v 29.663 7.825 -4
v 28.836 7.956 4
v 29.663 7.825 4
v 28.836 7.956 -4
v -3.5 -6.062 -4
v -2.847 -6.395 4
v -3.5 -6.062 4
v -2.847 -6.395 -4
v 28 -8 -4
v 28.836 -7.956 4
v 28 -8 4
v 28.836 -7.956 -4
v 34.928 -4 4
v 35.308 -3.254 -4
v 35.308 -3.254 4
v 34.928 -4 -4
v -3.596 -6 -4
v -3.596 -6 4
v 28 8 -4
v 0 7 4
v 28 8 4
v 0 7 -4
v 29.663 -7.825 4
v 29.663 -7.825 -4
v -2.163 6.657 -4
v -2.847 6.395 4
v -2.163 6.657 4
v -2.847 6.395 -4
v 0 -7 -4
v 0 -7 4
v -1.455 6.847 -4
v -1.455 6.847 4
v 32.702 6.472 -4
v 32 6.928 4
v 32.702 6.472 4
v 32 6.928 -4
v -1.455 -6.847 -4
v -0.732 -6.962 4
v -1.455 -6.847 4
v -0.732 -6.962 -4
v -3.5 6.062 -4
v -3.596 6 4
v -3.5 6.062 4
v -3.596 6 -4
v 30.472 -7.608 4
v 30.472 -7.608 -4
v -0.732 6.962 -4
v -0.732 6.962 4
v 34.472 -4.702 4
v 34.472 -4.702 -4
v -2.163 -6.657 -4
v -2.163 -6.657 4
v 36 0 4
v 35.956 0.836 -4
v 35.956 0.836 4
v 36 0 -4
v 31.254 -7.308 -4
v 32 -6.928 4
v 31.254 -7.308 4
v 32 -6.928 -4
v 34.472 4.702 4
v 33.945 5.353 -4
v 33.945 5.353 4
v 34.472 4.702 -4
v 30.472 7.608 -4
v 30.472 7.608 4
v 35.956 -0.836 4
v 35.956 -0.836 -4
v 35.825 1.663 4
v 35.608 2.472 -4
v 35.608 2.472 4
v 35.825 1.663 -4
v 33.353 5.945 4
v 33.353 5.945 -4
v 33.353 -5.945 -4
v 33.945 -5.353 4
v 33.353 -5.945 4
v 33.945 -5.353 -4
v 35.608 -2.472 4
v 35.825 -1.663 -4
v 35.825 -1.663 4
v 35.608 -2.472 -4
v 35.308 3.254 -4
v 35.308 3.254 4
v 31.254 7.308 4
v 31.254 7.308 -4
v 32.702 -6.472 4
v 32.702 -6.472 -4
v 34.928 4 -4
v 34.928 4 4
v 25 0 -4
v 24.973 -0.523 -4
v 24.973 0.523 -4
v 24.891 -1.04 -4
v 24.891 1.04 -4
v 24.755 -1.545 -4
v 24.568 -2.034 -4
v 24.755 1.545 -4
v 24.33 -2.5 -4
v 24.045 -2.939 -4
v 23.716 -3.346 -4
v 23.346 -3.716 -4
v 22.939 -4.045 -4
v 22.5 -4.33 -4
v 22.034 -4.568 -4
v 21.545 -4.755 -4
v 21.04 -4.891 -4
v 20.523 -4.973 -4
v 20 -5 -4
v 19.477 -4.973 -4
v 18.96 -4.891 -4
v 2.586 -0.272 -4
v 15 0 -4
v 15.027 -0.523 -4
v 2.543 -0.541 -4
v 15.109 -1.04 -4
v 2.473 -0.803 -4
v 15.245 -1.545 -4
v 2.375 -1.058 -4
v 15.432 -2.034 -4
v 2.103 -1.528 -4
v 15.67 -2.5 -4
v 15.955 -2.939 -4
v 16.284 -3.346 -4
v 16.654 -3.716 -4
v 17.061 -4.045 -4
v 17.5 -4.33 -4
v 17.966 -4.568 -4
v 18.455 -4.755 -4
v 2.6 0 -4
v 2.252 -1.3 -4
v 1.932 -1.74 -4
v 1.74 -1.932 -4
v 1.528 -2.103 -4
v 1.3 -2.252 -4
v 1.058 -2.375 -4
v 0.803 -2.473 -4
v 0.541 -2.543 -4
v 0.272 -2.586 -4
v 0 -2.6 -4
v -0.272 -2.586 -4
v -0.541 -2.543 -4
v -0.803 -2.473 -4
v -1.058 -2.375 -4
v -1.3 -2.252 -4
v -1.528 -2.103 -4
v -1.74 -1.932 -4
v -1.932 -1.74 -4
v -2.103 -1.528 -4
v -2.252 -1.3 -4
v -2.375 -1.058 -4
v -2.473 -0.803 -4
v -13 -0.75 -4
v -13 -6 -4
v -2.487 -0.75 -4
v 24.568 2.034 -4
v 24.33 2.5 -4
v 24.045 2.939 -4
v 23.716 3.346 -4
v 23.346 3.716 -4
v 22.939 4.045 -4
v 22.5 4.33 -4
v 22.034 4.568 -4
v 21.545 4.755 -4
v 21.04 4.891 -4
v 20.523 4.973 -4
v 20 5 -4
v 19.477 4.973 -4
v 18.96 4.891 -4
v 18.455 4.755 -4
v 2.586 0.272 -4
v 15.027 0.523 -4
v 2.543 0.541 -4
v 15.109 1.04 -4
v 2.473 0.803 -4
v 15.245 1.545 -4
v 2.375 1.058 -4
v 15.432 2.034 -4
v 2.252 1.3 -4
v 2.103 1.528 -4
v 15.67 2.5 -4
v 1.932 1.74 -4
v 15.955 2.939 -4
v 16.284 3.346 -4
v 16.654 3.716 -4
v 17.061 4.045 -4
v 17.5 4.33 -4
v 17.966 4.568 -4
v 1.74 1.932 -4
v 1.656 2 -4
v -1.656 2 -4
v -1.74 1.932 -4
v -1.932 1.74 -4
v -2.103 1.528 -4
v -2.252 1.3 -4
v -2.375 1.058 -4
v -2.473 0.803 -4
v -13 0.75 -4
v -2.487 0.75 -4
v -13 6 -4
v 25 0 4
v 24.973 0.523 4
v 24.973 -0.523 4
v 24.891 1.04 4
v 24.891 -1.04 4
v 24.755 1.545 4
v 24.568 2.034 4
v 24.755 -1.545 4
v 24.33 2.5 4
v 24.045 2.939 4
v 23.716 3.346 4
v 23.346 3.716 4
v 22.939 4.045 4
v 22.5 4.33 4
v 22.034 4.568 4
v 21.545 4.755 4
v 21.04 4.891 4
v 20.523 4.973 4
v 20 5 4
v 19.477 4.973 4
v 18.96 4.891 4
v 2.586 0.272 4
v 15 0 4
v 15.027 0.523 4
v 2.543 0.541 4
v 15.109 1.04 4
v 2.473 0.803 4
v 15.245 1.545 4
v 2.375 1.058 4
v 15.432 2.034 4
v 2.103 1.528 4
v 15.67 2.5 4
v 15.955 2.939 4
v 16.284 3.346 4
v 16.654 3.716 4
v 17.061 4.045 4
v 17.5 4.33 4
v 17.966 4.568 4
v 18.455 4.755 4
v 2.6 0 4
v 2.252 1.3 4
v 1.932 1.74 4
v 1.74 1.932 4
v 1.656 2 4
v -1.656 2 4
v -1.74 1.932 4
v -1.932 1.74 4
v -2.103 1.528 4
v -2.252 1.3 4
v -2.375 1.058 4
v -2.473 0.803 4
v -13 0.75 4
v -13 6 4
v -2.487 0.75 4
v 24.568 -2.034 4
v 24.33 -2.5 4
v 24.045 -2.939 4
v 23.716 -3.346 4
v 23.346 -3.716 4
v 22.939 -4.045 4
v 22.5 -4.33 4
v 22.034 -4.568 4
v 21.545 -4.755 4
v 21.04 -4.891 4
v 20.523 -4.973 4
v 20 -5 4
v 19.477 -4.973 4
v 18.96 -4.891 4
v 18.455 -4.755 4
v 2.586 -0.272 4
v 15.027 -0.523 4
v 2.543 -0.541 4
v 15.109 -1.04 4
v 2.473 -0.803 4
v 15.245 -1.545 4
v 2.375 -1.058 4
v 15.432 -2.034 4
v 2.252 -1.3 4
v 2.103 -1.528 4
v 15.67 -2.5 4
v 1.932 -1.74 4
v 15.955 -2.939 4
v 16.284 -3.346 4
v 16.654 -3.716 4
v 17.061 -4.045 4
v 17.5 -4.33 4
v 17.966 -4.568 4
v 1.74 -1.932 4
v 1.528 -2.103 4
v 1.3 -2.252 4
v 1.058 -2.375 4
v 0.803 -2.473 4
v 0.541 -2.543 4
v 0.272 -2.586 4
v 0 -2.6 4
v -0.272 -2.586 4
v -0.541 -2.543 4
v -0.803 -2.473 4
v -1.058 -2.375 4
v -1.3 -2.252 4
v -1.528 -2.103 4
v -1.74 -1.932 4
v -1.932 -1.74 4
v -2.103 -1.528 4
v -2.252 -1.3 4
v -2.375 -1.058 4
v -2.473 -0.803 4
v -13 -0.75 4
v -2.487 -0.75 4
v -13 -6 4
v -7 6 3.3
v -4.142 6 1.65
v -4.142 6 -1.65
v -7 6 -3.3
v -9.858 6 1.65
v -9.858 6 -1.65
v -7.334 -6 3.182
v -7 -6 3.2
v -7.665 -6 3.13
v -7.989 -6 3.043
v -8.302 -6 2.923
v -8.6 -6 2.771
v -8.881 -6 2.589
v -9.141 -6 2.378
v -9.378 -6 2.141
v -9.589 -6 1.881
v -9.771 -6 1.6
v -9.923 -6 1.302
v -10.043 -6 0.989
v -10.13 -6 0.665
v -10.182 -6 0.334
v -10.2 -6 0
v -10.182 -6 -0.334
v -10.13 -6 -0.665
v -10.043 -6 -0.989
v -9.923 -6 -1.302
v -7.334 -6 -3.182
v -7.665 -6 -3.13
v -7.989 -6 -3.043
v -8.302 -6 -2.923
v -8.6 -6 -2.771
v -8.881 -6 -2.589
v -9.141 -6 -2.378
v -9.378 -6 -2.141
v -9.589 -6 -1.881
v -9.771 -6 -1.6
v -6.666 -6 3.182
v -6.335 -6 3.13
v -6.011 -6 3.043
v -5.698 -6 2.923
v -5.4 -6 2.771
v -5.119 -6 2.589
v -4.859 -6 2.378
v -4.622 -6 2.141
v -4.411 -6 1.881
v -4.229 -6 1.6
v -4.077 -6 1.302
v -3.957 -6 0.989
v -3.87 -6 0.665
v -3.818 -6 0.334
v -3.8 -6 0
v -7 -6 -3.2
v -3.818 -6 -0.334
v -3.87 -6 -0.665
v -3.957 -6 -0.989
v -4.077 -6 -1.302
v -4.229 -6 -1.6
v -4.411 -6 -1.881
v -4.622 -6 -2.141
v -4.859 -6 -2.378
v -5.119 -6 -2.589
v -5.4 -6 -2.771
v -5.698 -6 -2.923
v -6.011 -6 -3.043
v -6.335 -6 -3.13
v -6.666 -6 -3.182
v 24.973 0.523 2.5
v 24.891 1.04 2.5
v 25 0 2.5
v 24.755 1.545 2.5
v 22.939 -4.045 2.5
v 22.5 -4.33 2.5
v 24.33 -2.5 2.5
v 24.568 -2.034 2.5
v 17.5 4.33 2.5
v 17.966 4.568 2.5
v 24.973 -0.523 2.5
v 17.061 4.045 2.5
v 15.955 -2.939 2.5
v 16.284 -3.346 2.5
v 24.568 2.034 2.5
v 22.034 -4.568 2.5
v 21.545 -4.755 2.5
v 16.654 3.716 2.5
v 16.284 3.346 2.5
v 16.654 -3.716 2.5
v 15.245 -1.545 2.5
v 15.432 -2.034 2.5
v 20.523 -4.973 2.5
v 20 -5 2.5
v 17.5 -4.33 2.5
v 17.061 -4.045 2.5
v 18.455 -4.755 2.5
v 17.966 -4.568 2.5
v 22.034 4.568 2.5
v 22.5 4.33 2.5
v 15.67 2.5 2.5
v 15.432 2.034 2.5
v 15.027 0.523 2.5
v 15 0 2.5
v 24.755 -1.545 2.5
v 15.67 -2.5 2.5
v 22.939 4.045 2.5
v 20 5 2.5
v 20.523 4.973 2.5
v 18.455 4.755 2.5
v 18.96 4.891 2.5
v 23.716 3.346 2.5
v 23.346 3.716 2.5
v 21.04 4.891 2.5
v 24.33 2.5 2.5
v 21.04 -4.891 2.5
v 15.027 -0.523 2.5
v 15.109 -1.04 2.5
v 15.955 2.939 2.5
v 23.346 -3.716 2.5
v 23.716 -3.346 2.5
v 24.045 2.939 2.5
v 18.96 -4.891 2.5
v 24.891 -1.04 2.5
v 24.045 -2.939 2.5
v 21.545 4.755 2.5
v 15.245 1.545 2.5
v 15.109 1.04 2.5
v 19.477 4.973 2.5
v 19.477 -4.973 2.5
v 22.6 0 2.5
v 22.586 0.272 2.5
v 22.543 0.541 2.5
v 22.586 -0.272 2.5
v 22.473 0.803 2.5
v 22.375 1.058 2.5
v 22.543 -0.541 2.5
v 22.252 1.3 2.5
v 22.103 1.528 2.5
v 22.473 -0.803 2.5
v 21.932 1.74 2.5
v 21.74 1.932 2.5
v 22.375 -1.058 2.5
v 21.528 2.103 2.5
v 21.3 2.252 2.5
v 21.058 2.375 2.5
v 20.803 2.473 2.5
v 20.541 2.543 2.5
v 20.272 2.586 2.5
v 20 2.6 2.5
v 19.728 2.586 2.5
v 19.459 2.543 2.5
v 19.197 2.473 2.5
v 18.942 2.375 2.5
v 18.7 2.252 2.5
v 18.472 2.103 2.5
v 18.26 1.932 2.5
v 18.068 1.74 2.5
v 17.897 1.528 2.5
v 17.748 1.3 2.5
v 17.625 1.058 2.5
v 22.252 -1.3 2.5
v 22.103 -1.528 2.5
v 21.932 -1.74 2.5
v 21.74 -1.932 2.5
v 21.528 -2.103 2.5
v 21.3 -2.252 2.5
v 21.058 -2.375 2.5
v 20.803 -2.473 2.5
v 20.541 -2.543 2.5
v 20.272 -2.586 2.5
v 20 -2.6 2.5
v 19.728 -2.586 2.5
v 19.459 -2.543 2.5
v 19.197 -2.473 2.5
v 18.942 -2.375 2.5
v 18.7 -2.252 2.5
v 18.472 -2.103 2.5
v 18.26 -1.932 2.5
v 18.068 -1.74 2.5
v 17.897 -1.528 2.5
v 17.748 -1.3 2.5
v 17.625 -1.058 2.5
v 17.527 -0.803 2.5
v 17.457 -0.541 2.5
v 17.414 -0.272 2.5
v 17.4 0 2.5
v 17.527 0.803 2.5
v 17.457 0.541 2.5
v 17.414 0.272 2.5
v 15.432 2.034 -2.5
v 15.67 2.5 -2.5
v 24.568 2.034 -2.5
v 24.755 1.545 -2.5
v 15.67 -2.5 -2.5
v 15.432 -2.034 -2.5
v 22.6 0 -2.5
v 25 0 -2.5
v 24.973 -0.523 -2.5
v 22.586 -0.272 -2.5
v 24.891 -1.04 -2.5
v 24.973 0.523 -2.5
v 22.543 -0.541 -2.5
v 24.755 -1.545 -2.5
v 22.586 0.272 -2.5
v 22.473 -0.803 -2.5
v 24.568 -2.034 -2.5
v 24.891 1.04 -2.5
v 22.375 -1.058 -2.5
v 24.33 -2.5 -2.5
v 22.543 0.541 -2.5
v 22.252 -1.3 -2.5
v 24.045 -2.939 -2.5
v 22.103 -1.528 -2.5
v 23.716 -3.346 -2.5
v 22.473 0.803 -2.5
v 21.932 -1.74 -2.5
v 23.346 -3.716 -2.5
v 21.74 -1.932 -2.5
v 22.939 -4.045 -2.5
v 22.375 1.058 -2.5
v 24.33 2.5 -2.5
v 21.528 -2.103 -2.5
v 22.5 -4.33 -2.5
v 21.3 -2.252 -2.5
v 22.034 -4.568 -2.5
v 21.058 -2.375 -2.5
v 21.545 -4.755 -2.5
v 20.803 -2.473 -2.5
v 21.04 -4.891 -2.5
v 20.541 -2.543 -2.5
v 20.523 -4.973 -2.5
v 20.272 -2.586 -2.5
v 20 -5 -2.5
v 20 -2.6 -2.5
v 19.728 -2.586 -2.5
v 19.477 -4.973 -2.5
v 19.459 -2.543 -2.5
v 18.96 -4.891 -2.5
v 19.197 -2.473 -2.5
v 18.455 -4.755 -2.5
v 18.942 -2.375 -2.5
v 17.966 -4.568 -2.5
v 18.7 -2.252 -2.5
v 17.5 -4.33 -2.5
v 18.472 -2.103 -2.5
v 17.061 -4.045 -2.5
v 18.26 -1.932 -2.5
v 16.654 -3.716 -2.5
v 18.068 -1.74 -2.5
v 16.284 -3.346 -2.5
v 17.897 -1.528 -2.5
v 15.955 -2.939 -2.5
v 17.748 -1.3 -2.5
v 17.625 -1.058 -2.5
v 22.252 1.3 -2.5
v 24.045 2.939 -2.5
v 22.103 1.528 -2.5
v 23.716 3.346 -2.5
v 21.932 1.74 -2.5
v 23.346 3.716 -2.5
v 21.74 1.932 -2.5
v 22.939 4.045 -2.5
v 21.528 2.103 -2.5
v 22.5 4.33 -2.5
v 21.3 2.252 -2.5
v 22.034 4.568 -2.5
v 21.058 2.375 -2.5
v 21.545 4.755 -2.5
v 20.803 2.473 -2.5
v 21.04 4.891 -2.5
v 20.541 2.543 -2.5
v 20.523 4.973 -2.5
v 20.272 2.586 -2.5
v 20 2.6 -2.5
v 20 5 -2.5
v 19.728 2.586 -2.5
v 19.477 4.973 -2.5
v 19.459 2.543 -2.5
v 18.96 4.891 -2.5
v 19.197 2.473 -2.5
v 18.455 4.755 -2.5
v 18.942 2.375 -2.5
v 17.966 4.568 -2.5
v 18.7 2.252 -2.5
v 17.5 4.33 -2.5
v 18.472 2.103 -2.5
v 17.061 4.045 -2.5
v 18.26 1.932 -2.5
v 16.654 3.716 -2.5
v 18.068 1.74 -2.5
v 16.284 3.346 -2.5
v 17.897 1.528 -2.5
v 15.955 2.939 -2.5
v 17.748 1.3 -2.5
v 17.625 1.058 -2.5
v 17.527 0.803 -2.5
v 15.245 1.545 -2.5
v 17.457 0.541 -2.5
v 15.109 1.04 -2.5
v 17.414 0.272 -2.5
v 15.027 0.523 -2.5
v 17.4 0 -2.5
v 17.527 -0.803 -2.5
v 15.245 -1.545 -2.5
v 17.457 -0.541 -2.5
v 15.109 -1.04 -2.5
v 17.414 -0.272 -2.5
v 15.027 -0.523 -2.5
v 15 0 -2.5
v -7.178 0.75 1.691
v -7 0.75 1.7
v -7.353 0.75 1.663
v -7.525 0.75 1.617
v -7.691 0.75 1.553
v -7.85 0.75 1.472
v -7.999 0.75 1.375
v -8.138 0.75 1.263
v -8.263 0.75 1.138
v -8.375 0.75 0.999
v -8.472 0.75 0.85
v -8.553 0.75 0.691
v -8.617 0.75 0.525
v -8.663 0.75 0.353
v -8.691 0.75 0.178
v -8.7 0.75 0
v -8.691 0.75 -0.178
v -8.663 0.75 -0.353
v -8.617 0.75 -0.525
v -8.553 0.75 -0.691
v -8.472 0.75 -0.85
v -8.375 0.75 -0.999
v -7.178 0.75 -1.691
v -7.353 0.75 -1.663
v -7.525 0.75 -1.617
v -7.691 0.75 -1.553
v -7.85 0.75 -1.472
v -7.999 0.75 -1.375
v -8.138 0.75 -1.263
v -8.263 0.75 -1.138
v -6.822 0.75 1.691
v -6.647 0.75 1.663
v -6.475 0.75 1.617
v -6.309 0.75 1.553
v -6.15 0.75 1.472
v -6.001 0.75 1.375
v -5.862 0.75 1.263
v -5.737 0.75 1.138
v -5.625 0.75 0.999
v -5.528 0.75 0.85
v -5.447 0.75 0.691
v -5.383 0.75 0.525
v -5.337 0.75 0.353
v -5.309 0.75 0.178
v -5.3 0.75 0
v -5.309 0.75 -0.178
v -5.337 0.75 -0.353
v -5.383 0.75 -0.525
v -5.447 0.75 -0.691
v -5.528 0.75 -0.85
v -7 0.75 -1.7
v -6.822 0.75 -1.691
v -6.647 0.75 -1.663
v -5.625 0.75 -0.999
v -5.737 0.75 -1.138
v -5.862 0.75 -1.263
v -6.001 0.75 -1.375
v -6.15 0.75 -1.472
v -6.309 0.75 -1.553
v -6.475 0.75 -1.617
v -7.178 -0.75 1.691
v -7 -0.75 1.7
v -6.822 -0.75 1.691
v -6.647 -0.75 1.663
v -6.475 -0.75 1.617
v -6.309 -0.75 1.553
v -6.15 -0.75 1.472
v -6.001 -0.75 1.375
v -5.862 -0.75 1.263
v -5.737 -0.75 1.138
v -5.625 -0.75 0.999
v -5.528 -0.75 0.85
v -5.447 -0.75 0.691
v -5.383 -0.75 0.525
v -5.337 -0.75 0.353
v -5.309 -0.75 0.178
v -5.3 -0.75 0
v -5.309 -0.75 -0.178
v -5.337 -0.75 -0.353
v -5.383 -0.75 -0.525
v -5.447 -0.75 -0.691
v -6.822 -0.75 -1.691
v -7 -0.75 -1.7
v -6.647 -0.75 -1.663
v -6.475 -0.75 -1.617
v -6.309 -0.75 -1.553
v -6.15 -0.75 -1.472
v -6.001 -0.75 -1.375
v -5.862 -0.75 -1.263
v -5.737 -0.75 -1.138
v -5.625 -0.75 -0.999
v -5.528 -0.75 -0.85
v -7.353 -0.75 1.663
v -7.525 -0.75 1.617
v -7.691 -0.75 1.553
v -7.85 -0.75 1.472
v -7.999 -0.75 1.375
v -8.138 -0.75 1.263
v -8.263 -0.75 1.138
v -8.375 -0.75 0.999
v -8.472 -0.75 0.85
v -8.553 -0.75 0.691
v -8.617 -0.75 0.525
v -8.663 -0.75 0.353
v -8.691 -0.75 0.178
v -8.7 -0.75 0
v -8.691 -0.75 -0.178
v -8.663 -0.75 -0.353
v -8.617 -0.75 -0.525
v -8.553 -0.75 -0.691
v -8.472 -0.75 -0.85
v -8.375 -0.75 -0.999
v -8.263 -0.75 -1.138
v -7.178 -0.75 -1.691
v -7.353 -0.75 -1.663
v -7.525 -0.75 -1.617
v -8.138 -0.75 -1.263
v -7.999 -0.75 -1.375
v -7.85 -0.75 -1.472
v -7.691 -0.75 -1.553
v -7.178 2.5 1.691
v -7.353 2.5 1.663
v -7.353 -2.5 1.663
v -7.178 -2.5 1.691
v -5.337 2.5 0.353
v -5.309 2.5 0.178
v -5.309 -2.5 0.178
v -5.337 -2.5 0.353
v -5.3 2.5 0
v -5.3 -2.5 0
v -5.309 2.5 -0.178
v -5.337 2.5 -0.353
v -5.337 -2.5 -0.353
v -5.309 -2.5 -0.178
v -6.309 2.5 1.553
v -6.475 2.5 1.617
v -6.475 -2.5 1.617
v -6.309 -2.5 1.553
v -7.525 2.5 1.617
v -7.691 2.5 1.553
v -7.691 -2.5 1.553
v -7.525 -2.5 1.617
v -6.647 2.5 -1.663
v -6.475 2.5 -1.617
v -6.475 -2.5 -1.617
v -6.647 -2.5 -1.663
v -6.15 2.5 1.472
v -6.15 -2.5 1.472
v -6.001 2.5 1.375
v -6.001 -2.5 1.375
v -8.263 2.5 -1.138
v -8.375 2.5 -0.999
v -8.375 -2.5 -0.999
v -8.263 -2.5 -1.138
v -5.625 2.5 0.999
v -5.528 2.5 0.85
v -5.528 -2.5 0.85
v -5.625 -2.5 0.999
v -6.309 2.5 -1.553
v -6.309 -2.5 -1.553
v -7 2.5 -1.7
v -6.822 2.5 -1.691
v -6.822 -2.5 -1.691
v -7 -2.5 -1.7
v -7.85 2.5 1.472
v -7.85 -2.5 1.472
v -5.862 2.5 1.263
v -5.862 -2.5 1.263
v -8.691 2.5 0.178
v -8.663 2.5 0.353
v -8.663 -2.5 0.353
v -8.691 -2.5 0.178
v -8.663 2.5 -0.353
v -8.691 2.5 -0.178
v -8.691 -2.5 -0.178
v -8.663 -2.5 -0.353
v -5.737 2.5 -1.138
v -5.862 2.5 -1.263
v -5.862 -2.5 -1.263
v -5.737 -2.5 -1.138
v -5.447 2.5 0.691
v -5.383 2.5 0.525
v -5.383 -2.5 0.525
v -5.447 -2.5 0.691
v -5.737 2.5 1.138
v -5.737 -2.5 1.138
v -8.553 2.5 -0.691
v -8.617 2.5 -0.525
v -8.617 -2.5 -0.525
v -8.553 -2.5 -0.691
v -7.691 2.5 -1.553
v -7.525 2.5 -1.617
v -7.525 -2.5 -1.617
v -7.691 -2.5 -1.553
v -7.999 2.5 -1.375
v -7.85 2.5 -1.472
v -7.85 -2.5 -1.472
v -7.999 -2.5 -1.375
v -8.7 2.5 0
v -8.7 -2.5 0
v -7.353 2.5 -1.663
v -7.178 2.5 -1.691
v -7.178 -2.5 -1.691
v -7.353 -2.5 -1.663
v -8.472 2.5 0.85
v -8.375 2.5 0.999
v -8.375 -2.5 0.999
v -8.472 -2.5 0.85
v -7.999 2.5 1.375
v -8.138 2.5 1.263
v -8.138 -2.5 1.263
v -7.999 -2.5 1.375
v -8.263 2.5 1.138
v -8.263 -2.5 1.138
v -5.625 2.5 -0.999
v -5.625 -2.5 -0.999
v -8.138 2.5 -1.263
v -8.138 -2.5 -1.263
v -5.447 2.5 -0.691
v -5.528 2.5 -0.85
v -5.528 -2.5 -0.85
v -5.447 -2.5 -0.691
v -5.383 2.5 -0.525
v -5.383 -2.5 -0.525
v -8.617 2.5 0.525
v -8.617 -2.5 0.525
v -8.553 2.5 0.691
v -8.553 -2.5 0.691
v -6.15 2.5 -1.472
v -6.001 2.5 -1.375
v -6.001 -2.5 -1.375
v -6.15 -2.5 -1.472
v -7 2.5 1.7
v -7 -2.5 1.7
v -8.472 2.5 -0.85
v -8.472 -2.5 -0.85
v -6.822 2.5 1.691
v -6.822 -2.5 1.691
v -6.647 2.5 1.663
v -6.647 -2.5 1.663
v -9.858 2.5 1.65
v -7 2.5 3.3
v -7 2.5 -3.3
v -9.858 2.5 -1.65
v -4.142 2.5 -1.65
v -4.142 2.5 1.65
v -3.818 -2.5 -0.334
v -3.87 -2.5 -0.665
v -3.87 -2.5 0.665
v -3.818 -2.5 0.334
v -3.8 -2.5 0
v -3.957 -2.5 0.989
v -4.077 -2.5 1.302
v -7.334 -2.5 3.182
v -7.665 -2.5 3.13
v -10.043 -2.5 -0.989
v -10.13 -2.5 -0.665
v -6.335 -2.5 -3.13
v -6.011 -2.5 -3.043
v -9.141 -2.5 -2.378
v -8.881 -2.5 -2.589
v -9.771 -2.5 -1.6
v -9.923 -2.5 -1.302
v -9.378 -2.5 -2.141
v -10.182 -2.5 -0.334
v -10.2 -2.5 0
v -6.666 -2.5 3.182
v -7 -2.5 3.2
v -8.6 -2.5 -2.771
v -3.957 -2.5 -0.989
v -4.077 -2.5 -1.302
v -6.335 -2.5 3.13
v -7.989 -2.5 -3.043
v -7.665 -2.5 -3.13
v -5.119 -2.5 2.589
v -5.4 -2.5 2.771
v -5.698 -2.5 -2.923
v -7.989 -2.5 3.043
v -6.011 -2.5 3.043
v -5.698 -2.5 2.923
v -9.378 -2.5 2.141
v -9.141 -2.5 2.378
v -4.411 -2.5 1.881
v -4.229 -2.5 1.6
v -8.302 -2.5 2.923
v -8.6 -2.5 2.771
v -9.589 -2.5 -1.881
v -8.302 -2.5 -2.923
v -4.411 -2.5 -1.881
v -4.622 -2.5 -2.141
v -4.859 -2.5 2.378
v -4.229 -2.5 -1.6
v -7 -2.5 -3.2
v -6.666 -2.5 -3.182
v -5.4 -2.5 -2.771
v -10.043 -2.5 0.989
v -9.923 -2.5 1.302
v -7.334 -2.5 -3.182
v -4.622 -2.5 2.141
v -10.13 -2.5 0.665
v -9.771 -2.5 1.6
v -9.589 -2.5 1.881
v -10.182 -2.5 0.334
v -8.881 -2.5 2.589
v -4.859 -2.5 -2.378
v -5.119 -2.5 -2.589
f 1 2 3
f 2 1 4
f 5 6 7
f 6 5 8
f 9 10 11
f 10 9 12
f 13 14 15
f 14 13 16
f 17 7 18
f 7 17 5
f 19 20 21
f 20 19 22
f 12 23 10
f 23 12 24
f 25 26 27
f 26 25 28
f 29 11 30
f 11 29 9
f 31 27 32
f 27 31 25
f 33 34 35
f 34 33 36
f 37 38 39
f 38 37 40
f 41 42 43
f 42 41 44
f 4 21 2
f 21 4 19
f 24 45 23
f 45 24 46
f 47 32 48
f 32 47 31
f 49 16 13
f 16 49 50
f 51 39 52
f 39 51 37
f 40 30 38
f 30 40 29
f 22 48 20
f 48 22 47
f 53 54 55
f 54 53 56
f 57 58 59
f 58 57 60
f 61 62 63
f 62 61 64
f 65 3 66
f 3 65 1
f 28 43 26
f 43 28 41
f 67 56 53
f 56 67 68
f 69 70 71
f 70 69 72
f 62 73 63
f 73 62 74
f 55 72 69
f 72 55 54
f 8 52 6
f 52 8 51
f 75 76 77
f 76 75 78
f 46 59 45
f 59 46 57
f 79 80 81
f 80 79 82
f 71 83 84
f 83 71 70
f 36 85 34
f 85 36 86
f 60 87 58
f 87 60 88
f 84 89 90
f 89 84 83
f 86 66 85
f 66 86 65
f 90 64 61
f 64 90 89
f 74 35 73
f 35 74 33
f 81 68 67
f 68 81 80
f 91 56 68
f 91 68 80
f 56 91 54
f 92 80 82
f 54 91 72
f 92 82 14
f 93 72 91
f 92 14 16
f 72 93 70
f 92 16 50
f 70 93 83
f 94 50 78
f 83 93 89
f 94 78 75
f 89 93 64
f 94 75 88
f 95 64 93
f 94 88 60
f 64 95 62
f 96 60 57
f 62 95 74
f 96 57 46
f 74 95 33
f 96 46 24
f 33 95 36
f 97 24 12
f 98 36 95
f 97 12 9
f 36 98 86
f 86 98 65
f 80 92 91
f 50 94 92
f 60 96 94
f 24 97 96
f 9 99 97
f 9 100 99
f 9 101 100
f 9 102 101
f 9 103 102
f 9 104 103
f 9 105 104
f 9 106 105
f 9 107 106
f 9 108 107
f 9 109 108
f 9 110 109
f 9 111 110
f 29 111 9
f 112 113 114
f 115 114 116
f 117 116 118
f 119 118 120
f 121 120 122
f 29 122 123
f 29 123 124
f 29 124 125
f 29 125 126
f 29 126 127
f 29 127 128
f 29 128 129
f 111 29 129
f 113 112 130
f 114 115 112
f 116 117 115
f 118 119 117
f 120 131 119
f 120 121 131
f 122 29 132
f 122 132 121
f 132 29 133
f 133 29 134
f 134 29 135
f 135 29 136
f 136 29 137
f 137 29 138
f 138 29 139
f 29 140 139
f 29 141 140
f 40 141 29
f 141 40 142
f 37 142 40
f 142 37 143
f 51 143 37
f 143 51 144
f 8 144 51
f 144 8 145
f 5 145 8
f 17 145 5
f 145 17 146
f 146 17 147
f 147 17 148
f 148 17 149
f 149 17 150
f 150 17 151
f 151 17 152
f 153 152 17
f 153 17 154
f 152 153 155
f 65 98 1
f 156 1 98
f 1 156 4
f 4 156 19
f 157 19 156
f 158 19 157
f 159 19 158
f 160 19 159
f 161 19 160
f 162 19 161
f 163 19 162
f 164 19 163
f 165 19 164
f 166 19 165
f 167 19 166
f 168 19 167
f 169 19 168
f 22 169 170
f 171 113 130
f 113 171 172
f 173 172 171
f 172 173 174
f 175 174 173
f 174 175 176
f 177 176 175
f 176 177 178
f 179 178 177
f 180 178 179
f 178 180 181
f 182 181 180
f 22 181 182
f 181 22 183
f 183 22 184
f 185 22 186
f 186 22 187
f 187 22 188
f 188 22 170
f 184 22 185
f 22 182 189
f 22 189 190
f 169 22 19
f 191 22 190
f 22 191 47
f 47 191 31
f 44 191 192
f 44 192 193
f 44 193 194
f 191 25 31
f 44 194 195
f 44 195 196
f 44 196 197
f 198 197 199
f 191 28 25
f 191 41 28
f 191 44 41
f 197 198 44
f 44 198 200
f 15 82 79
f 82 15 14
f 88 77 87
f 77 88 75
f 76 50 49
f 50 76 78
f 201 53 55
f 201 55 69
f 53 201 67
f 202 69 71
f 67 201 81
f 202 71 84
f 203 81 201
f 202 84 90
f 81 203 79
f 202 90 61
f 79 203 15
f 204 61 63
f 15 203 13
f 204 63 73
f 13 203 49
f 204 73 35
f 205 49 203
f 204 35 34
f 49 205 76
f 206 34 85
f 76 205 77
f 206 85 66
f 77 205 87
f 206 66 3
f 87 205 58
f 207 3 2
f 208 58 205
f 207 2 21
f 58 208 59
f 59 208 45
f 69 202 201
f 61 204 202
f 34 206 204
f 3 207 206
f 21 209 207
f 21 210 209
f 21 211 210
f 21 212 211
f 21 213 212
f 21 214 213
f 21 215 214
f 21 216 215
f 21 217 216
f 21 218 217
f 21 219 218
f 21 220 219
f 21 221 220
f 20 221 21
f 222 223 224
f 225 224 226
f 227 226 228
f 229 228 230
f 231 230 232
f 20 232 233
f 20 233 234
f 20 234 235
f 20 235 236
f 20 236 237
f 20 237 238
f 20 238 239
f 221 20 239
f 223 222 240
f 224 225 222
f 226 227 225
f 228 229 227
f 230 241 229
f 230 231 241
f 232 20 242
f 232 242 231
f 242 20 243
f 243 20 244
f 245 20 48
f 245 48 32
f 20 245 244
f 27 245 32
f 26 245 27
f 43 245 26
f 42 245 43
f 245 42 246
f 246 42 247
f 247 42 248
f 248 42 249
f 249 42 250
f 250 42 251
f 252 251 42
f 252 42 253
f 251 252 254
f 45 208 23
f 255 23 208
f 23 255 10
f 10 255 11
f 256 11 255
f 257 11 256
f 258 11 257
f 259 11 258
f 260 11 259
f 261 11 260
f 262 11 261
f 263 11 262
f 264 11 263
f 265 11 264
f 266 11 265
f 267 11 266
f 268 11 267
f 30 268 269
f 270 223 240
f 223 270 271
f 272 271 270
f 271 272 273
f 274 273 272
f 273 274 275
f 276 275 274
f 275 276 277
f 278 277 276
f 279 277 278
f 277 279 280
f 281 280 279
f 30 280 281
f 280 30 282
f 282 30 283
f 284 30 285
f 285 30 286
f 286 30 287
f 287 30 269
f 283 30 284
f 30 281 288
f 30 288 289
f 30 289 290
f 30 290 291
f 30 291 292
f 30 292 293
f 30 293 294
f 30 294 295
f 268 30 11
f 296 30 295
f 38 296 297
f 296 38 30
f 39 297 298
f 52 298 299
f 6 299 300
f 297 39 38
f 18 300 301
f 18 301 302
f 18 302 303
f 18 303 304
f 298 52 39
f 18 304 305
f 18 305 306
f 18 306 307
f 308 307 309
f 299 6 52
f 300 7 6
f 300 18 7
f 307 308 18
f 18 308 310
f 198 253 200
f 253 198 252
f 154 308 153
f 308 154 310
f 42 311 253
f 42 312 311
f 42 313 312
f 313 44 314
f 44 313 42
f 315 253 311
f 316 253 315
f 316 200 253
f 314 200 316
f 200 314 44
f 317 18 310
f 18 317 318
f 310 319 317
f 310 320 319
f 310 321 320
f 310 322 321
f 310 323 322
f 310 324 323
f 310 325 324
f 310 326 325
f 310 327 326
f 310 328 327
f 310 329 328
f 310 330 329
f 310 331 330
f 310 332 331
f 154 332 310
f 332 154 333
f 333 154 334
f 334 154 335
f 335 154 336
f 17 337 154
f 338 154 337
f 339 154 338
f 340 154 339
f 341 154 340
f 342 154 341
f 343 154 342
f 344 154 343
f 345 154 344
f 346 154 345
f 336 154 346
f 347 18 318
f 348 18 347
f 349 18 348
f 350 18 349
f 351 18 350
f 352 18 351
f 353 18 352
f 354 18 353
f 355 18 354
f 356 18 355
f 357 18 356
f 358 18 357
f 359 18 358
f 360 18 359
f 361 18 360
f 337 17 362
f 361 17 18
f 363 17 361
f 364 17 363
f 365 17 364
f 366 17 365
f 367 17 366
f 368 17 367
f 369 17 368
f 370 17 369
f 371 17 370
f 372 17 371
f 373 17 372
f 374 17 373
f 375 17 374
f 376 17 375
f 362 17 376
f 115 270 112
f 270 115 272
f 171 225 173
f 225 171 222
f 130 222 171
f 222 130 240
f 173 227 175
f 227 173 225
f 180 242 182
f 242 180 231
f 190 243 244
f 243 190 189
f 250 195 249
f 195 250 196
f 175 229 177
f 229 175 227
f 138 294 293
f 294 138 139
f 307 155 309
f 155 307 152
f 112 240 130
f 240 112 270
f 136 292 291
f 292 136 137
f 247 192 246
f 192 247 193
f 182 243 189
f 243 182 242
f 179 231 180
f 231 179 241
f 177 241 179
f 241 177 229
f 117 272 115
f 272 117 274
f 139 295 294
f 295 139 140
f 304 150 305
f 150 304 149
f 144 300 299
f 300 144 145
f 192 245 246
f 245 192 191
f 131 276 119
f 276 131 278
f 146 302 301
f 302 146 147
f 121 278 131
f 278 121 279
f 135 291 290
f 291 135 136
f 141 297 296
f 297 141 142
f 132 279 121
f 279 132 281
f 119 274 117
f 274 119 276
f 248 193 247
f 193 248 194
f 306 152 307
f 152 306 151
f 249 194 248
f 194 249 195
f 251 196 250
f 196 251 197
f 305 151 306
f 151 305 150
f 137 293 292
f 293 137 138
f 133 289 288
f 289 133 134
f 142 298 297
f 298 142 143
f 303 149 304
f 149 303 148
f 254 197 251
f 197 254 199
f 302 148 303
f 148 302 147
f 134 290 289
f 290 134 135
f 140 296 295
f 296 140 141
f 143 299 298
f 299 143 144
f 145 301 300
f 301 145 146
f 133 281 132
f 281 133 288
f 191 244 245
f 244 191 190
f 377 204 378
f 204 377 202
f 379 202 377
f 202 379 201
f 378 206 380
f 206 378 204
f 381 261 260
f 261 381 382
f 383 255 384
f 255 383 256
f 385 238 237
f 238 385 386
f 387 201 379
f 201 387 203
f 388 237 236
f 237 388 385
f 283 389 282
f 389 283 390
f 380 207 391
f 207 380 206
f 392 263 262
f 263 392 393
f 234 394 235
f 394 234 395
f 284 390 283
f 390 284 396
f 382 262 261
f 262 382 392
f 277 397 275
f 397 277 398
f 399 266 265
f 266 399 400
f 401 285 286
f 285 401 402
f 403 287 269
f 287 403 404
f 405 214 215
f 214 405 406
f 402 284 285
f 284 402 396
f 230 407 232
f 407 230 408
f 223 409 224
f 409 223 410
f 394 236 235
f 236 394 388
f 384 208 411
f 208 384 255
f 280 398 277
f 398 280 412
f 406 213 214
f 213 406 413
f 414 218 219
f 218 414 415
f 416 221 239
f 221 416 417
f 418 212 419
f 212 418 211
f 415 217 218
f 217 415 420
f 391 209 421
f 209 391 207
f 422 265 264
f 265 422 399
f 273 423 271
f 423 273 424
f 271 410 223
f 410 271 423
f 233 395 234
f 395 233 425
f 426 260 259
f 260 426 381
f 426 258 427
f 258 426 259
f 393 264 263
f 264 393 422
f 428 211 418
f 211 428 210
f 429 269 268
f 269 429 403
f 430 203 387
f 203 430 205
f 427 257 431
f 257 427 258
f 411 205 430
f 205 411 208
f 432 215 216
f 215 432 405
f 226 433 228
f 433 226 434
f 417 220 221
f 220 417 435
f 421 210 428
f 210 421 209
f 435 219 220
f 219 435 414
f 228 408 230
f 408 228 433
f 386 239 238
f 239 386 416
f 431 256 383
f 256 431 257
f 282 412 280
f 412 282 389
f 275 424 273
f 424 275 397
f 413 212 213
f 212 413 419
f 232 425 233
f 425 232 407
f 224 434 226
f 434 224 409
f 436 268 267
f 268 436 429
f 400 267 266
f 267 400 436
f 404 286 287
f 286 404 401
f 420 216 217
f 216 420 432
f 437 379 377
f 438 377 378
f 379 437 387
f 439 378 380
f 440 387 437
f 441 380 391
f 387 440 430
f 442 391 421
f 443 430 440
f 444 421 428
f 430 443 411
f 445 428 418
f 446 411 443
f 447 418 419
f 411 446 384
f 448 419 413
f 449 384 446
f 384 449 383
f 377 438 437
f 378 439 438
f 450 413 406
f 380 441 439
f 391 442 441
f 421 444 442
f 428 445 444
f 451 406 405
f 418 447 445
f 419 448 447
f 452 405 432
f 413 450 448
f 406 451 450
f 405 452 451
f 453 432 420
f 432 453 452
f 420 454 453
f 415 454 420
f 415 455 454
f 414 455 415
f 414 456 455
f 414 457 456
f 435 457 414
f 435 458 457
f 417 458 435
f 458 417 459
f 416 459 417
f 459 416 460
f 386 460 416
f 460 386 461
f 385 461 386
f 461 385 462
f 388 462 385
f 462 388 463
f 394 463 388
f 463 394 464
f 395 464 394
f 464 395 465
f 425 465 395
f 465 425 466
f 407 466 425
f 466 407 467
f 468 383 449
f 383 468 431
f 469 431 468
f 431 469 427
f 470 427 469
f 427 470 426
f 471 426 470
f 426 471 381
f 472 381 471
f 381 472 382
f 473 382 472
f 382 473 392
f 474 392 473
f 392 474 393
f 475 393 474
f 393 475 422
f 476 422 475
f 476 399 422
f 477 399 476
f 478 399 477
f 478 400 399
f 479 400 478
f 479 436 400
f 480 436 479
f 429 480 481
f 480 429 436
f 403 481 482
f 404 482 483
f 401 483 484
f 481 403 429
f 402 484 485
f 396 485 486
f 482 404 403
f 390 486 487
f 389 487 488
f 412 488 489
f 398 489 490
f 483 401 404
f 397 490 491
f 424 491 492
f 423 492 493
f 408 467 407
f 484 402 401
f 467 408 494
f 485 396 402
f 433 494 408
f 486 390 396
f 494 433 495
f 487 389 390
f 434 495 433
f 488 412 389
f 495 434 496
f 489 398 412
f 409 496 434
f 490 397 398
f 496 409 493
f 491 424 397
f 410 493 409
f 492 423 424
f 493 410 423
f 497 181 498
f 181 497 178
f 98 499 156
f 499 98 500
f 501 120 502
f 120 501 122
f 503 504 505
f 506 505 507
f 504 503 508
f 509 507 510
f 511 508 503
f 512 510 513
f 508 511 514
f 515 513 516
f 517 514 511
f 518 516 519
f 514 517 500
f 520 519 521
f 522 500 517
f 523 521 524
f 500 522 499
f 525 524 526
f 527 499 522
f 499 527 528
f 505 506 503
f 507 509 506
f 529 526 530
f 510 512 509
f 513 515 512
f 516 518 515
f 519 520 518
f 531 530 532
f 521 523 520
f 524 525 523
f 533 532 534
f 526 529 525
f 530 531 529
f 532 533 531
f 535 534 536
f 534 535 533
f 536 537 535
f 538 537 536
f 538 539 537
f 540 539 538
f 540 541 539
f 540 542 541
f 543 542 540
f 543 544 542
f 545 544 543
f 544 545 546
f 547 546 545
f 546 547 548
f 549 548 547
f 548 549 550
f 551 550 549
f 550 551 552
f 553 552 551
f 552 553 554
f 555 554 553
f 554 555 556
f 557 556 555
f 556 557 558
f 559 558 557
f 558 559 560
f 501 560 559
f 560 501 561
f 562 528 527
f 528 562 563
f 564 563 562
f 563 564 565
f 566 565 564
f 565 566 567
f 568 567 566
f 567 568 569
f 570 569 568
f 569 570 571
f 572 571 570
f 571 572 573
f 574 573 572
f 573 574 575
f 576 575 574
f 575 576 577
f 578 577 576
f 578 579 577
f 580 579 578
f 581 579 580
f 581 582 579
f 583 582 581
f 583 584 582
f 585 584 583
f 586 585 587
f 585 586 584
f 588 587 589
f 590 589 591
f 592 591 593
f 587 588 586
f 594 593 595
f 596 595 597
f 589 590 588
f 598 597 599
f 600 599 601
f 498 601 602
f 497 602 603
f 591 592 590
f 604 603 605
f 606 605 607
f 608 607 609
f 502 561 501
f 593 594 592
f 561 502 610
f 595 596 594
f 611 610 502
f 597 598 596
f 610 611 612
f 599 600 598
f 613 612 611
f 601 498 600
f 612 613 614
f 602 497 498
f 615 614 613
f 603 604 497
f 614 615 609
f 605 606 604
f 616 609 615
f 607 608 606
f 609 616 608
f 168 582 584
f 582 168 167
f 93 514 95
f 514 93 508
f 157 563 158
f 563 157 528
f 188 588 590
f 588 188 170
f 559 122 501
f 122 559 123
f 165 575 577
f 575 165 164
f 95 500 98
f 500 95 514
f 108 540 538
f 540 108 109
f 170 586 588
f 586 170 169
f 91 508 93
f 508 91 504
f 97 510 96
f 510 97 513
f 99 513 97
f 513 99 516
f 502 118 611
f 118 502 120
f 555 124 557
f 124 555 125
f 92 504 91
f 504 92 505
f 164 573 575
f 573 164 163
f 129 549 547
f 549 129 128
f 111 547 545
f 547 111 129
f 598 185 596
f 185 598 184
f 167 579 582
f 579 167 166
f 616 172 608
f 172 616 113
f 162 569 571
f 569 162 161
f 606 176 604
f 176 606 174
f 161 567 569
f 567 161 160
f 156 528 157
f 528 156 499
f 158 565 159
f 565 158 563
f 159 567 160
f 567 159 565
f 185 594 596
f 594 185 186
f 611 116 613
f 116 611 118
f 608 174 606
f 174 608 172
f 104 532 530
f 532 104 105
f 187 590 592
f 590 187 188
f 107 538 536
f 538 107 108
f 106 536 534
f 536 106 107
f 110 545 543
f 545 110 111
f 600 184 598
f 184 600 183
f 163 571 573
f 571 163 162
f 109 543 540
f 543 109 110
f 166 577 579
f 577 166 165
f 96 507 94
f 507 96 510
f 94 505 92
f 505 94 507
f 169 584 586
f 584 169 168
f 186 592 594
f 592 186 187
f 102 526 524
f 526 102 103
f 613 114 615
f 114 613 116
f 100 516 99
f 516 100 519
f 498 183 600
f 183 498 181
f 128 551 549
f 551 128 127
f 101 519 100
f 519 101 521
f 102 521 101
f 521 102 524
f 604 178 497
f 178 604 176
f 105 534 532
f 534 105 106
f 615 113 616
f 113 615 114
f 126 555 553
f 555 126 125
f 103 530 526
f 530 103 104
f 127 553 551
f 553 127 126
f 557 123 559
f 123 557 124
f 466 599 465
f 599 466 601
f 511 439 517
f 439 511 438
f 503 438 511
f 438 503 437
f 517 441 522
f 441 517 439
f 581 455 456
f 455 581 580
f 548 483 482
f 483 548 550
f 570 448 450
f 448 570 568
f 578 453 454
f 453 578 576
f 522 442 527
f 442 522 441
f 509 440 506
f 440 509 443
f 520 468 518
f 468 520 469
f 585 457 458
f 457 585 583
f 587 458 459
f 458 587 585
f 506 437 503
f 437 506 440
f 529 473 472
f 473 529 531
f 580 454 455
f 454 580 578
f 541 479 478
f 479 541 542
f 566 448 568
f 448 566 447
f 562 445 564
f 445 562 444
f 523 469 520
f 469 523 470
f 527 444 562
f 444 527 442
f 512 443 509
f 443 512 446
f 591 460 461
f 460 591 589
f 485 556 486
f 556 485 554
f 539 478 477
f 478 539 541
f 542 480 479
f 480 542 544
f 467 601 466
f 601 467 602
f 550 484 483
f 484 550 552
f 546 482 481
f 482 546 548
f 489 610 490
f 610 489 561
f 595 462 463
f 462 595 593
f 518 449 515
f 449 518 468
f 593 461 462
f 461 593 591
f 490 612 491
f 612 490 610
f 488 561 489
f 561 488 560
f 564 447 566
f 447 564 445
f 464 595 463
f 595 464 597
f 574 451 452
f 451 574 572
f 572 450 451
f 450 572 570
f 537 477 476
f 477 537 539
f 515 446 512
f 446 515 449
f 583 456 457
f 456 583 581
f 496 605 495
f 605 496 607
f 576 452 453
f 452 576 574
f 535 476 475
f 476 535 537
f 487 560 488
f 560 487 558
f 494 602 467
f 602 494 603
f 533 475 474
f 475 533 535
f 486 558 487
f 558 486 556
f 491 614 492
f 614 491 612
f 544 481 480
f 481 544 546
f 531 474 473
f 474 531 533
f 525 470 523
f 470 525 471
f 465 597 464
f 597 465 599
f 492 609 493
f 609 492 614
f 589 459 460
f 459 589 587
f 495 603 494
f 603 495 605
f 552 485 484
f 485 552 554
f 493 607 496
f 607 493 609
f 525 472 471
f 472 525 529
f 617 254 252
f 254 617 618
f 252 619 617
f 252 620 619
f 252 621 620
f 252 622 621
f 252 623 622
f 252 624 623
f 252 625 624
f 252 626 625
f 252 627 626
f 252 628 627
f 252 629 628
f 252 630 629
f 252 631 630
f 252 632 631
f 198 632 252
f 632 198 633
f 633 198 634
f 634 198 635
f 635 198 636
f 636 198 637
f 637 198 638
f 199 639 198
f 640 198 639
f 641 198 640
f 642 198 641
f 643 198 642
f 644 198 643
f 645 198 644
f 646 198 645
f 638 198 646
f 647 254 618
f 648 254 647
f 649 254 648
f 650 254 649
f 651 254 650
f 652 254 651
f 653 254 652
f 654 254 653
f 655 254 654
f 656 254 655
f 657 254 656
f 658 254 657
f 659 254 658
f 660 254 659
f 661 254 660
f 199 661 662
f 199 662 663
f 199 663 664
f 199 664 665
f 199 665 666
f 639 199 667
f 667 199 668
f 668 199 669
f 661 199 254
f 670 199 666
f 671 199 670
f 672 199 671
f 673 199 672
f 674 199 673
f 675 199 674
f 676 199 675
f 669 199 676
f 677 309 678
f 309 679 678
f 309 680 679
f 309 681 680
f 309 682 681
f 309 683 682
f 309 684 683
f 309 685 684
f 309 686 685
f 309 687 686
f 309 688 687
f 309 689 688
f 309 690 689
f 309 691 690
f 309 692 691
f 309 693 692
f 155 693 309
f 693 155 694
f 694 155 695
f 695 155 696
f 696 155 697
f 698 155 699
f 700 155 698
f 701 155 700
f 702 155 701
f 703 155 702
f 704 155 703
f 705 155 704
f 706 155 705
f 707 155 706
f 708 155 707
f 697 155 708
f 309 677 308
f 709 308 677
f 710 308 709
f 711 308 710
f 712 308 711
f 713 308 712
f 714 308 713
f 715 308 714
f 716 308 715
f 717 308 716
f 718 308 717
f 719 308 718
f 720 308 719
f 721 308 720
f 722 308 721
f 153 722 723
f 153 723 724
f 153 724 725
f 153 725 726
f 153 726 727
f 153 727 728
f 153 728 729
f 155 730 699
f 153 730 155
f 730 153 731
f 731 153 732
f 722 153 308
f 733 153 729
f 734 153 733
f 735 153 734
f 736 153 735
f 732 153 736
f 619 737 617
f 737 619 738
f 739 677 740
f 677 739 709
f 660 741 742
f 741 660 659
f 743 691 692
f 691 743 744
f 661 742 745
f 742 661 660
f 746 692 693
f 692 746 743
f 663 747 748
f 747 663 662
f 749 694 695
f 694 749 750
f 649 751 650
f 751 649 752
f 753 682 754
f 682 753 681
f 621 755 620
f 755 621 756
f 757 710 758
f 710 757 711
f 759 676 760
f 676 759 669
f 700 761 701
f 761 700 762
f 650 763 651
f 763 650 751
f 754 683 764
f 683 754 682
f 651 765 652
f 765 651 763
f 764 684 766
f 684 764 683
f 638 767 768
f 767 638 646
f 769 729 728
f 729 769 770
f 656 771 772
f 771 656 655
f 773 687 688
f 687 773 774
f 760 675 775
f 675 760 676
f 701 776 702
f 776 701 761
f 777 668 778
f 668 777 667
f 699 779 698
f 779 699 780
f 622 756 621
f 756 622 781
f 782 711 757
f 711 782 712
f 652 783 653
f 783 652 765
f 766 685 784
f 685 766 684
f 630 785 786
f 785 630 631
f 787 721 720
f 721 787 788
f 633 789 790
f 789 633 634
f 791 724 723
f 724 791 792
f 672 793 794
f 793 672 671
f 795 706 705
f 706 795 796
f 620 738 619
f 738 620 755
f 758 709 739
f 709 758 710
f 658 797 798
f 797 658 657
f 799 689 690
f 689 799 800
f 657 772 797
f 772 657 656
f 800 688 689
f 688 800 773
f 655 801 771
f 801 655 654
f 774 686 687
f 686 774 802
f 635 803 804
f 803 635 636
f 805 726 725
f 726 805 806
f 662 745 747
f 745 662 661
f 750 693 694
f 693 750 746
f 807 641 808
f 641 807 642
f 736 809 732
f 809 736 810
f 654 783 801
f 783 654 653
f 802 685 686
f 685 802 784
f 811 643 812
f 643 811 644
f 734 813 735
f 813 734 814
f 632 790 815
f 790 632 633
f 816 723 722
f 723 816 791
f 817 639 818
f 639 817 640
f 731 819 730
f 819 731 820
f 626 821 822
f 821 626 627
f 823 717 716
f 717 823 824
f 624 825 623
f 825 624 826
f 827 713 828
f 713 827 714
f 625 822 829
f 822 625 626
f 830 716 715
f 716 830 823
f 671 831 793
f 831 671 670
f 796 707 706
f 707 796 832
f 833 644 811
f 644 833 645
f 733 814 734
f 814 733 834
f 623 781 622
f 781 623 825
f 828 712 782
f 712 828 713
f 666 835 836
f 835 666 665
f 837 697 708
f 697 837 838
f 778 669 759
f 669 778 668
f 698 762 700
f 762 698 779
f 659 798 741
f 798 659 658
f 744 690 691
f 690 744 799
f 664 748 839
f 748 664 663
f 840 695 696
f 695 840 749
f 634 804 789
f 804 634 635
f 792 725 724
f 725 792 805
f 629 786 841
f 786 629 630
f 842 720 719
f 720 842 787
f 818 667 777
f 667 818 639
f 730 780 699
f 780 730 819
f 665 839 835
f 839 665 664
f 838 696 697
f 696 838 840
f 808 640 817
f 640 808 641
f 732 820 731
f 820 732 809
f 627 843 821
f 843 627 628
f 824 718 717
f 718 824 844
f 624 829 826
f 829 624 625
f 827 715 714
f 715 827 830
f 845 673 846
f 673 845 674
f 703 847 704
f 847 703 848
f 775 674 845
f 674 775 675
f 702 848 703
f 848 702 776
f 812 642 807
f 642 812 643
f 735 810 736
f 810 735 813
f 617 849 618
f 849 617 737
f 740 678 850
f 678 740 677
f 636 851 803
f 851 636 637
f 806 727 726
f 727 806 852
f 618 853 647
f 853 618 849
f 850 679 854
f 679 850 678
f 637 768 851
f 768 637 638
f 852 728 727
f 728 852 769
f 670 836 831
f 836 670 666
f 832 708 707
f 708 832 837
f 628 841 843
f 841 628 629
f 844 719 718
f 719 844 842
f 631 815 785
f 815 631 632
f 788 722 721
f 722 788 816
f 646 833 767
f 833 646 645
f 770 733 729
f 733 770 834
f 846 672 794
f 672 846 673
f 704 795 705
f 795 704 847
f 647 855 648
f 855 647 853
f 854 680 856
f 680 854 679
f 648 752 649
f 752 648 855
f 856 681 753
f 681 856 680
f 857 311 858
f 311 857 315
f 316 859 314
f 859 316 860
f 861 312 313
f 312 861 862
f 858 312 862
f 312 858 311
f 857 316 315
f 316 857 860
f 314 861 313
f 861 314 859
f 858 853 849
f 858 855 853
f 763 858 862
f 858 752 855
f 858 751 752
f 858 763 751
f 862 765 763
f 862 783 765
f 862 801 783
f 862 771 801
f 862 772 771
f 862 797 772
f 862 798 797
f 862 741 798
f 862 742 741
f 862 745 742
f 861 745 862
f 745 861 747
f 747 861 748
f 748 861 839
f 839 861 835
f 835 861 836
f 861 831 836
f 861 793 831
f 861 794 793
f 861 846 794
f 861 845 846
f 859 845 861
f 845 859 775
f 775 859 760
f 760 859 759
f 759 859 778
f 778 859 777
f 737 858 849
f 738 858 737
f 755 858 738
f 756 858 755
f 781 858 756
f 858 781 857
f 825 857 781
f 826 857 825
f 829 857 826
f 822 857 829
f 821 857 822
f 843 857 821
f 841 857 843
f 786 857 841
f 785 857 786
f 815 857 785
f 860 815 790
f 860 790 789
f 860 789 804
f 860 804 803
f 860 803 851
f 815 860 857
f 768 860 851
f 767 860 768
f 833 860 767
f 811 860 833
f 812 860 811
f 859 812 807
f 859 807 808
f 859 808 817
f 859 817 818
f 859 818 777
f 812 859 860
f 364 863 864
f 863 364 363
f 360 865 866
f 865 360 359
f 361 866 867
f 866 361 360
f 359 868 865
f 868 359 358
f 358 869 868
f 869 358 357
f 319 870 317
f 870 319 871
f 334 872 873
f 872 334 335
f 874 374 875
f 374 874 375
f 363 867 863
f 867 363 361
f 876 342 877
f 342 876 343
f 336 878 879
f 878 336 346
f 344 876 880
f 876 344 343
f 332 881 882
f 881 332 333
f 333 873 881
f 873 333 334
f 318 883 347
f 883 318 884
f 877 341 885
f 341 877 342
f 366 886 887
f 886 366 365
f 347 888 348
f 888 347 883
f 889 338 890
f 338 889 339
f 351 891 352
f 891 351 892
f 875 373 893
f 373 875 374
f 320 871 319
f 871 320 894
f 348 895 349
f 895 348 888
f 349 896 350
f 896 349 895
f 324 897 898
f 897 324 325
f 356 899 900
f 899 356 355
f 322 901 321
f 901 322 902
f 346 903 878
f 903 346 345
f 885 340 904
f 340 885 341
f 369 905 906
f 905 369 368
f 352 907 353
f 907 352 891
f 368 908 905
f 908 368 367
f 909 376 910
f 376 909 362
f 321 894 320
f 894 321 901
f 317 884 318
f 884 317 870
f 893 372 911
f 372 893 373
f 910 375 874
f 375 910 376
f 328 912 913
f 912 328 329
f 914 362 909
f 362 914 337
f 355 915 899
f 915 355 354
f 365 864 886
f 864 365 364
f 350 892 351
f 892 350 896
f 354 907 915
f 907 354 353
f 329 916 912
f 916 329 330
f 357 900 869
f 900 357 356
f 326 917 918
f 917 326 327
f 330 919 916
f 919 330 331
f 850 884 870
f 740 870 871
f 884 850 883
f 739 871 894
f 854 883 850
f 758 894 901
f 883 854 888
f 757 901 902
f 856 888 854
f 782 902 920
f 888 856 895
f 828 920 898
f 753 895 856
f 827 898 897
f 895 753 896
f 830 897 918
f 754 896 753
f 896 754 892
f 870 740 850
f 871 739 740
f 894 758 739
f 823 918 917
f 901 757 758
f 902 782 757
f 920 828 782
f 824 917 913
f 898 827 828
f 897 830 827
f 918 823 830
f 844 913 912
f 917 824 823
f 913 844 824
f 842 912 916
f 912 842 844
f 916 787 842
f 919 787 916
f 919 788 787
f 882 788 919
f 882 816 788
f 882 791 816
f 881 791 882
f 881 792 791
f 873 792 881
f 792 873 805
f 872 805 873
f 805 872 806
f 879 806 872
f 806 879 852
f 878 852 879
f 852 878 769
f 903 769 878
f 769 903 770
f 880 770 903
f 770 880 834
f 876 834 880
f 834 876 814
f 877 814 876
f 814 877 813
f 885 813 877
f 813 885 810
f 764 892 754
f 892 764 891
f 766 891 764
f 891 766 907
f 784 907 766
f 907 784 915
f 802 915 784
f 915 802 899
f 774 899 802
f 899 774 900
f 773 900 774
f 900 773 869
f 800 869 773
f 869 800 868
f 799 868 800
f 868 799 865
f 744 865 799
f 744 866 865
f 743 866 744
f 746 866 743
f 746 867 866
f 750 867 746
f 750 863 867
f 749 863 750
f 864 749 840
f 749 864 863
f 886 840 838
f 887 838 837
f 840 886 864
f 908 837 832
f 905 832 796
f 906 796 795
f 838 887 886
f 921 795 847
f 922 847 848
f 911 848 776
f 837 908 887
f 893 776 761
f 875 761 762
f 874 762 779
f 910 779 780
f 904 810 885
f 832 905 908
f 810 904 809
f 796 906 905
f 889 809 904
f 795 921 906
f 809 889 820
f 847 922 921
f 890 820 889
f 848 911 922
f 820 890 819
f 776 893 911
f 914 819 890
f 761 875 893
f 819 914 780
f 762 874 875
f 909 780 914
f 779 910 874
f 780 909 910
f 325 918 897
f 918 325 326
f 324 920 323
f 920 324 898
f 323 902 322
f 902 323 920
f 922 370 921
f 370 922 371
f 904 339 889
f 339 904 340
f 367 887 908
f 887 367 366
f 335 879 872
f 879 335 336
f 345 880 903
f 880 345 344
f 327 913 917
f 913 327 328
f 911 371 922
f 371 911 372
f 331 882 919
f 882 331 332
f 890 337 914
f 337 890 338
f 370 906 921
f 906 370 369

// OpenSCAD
// clamping_motor_horn.scad - 3D Printable Motor Horn (STL Export)
// v4: NO TAPER, a small local recess around the rod-end hole (matching the
// ball-stud's short thread length), and a nested hex nut trap on the nut
// side so the M5 nut seats flush and doesn't spin while tightening.
//
// v2 removed the long gradual taper (the actual weak point - it thinned
// material over the whole outer arm, exactly where bending stress is
// highest). v3 added a small symmetric recess just around the hole to match
// the ball-stud's short usable thread length, kept symmetric on purpose
// (not one-sided) because the crank pushes and pulls in both directions
// through its rotation - an even split handles both load directions,
// instead of preferentially weakening whichever face a one-sided cut would
// thin. v4 nests a small hex cutout inside the nut-side half of that
// recess - deeper than the round pocket, but only across the hex footprint,
// so it stays a small, contained feature rather than another full-face cut.
//
// PRINT ORIENTATION STILL MATTERS: print standing on edge (flat face
// vertical), not lying flat, so layer lines run along the arm's length.

$fn = 60;

// --- User Parameters ---
throw_length = 20.0;       // Distance from motor shaft center to the rod-end hole
horn_thickness = 8.0;      // Thickness everywhere EXCEPT the local hole recess
hub_dia = 14.0;            // Outer diameter of the central hub
arm_width = 16.0;          // Width of the arm (slightly wider than the hub for a clean blend)
shaft_dia = 5.2;           // 5mm motor shaft + 0.2mm 3D printing tolerance
flat_depth = 0.6;          // Depth of the NEMA 17 D-shaft flat
m3_clearance = 1.7;        // 3.4mm diameter for M3 clamping bolt
m5_clearance = 2.6;        // 5.2mm diameter for the M5 rod-end hole
arm_end_margin = 8.0;      // Extra material past the M5 hole, so it doesn't
                           // break out through the tip edge

// Local recess around the hole, to match the ball-stud's short thread length
hole_depth = 5.0;          // target material thickness right at the hole
pocket_dia = 10.0;         // diameter of the recessed pad around the hole
pocket_cut = (horn_thickness - hole_depth) / 2; // removed from EACH face - kept
                           // symmetric on purpose: the crank pushes and pulls
                           // in both directions through its rotation, so an
                           // even split handles both load directions equally
                           // instead of preferentially weakening one of them

// Hex nut trap, NUT SIDE ONLY, nested inside the pocket above (not instead
// of it) - small and localized, just enough to grip the flats and stop the
// nut spinning while tightening, not a full-depth burial.
// IMPORTANT: this depth is measured from the same outer face as pocket_cut,
// NOT stacked on top of it - so if hex_nut_depth > pocket_cut, the actual
// remaining material at the hole is thinner than hole_depth, not equal to
// it. Kept equal to pocket_cut here so the two add up to exactly
// (horn_thickness - hole_depth), hitting the real 5mm target precisely.
hex_nut_across_flats = 8.3; // M5 nut, 8mm nominal + slight clearance
hex_nut_r = hex_nut_across_flats / 1.732;
hex_nut_depth = pocket_cut; // = 1.5mm here - see note above before changing

// --- Cutout Modules ---
module d_shaft_cutout() {
    difference() {
        cylinder(r=shaft_dia/2, h=horn_thickness + 2, center=true);
        translate([0, (shaft_dia/2) - flat_depth + 2.5, 0])
            cube([shaft_dia+2, 5, horn_thickness + 4], center=true);
    }
}

arm_length = throw_length + arm_end_margin;

// --- Main Horn Geometry ---
difference() {
    union() {
        // Hub + arm, one continuous full-thickness hull - no taper stages
        hull() {
            cylinder(r=hub_dia/2, h=horn_thickness, center=true);
            translate([arm_length, 0, 0])
                cylinder(r=arm_width/2, h=horn_thickness, center=true);
        }

        // Clamping block (unchanged from the original design)
        translate([-7, 0, 0])
            cube([12, 12, horn_thickness], center=true);
    }

    // Motor shaft
    d_shaft_cutout();

    // Local recess around the rod-end hole, cut into BOTH faces symmetrically -
    // leaves a hole_depth-thick pad right at the hole, full thickness everywhere
    // else on the arm.
    translate([throw_length, 0, horn_thickness/2 - pocket_cut])
        cylinder(r=pocket_dia/2, h=pocket_cut + 0.5);
    translate([throw_length, 0, -horn_thickness/2 - 0.5])
        cylinder(r=pocket_dia/2, h=pocket_cut + 0.5);

    // Hex nut trap, nested inside the nut-side (bottom) pocket above - deeper
    // than the round pocket but only across the hex footprint, not the whole
    // pocket area, so it stays a small, contained feature
    translate([throw_length, 0, -horn_thickness/2 - 0.01])
        cylinder(r=hex_nut_r, h=hex_nut_depth, $fn=6);

    // Rod-end hole itself, now only as deep as hole_depth requires
    translate([throw_length, 0, 0])
        cylinder(r=m5_clearance, h=horn_thickness + 2, center=true);

    // Clamping slit (allows the plastic to flex and grip the shaft)
    translate([-10, 0, 0])
        cube([20, 1.5, horn_thickness + 2], center=true);

    // Clamping bolt hole (passes perpendicularly through the slit)
    translate([-7, 0, 0])
        rotate([90, 0, 0])
        cylinder(r=m3_clearance, h=20, center=true);

    // M3 hex nut trap
    translate([-7, 4.5, 0])
        rotate([90, 30, 0])
        cylinder(r=3.3, h=4, $fn=6, center=true);

    // Bolt head recess
    translate([-7, -4.5, 0])
        rotate([90, 0, 0])
        cylinder(r=3.2, h=4, center=true);
}
